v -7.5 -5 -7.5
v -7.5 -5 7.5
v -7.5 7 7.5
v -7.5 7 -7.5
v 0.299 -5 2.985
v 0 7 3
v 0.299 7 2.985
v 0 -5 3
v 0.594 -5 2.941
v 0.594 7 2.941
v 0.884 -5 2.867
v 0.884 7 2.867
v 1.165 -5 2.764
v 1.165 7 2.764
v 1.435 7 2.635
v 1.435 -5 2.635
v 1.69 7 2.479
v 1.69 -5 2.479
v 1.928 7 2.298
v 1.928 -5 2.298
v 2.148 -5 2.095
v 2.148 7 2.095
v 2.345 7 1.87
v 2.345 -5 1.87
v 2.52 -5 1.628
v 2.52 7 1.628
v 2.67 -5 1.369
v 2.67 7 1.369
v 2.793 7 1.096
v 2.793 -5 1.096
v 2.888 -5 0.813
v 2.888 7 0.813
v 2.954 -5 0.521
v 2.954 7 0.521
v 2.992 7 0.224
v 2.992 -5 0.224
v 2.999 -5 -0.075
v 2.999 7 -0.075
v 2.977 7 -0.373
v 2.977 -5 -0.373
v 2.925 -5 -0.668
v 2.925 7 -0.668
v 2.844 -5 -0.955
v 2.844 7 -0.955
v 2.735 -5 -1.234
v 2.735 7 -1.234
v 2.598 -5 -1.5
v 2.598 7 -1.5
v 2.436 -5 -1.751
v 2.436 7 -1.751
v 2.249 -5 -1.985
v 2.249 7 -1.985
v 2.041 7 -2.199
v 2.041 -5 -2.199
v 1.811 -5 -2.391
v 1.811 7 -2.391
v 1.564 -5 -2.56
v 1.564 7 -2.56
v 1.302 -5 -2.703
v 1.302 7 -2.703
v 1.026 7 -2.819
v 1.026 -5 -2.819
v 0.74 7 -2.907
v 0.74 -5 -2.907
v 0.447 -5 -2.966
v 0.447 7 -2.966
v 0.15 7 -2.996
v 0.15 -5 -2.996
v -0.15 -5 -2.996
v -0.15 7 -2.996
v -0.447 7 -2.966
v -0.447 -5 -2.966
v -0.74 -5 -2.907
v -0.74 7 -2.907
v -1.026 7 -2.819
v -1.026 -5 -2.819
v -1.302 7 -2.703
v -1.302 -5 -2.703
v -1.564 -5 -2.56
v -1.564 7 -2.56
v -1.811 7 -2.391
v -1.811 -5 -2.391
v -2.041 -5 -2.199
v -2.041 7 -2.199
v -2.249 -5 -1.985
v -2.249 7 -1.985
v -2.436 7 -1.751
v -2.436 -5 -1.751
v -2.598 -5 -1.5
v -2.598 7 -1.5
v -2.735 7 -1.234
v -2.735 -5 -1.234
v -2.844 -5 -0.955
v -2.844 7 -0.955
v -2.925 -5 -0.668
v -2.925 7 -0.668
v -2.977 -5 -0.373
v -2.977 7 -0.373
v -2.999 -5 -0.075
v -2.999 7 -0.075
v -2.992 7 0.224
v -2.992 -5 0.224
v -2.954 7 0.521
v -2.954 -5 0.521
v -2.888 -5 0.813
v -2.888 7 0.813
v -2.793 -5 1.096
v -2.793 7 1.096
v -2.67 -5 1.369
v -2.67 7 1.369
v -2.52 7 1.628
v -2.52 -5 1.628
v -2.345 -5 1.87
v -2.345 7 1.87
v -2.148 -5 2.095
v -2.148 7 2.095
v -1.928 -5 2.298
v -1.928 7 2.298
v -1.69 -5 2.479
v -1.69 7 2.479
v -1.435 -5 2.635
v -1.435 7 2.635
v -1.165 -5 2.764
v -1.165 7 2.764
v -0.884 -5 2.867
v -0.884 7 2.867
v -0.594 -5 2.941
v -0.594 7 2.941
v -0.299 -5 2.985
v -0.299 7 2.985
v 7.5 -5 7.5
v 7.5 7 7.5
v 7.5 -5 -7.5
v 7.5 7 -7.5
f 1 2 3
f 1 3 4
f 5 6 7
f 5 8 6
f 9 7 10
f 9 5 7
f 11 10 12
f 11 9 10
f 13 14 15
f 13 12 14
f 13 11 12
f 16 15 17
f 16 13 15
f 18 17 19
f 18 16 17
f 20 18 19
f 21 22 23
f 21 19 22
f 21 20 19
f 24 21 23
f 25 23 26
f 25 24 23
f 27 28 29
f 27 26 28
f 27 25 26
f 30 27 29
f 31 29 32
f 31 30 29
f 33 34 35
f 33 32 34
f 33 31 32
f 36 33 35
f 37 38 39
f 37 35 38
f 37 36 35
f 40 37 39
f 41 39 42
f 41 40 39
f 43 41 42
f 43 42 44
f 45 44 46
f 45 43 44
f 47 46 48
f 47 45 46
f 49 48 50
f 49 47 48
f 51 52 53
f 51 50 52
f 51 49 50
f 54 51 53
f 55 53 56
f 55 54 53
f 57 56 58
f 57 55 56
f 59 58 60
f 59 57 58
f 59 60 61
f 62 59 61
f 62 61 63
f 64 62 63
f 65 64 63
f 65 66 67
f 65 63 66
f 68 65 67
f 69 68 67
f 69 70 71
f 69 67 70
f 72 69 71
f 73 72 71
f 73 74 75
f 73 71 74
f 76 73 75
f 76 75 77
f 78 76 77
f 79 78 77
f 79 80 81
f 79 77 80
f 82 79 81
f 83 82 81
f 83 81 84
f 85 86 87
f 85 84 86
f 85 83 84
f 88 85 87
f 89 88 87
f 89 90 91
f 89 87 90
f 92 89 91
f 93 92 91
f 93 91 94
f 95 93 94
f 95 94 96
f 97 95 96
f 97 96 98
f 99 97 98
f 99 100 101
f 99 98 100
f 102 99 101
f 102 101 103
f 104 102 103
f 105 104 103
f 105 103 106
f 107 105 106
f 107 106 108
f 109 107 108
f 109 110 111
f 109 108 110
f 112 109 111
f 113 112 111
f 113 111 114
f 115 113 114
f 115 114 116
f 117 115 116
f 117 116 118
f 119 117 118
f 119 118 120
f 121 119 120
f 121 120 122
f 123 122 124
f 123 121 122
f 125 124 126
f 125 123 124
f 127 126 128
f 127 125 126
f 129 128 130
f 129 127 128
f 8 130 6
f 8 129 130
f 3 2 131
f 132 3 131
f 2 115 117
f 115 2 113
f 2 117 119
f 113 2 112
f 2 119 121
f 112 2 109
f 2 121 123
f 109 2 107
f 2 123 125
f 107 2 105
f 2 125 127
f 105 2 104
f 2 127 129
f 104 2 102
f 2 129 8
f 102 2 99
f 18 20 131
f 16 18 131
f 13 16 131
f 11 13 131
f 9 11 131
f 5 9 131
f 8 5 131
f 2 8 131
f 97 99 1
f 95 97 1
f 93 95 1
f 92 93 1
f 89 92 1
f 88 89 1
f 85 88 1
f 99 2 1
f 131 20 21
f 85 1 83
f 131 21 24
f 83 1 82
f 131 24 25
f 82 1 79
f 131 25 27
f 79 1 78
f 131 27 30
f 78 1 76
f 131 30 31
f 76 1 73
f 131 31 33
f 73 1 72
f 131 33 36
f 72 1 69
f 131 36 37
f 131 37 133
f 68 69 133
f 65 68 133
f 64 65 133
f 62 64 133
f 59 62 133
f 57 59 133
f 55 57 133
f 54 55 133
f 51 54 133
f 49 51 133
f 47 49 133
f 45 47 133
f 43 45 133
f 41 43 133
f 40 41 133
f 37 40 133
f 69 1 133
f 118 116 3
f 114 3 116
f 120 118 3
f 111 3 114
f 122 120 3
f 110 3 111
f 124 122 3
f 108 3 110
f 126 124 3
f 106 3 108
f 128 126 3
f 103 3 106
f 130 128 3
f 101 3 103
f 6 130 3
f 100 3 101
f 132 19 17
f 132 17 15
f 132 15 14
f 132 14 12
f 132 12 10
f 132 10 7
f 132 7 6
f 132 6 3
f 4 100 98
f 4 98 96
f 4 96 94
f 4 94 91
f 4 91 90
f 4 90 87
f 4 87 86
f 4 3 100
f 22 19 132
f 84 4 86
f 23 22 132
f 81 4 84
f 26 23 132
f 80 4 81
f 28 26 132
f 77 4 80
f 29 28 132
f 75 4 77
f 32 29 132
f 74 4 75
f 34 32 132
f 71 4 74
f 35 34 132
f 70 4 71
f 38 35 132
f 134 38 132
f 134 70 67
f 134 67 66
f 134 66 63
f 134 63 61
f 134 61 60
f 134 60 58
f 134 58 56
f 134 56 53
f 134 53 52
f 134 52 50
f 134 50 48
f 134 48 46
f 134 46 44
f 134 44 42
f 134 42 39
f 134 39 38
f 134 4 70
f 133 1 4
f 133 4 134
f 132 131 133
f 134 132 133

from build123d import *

# Parameters (mm, degrees)
SKETCH1_W               = 2.5
SKETCH1_H               = 2.5
BOSS_EXTRUDE1_DEPTH     = 2
CUT_EXTRUDE1_DEPTH      = 3.669269563
CUT_EXTRUDE1_DEPTH_BACK = 3.669269563
SKETCH2_R               = 0.5
SCALE1_SCALE            = 6


with BuildPart() as part:
    # Sketch1 → Boss-Extrude1 (new body)
    with BuildSketch(Plane(origin=(0, 0, 0), x_dir=(1, 0, 0), z_dir=(0, 1, 0))):
        Rectangle(SKETCH1_W, SKETCH1_H)
    extrude(amount=BOSS_EXTRUDE1_DEPTH)

    # Sketch2 → Cut-Extrude1 (cut, two sides: drawn at the far end of the back side and taken through both)
    with BuildSketch(Plane(origin=(0, 2, 0), x_dir=(1, 0, 0), z_dir=(0, 1, 0)).offset(-CUT_EXTRUDE1_DEPTH_BACK)):
        with Locations(Location((0, 0, 0), (0, 0, 270))):
            Circle(SKETCH2_R)
    extrude(amount=CUT_EXTRUDE1_DEPTH + CUT_EXTRUDE1_DEPTH_BACK, mode=Mode.SUBTRACT)


with BuildPart() as part_1:
    # Scale1: scaled about (0, 1, 0)
    add(part.part.scale(SCALE1_SCALE).moved(Location((0, -5, 0))))


solid = part_1.part
